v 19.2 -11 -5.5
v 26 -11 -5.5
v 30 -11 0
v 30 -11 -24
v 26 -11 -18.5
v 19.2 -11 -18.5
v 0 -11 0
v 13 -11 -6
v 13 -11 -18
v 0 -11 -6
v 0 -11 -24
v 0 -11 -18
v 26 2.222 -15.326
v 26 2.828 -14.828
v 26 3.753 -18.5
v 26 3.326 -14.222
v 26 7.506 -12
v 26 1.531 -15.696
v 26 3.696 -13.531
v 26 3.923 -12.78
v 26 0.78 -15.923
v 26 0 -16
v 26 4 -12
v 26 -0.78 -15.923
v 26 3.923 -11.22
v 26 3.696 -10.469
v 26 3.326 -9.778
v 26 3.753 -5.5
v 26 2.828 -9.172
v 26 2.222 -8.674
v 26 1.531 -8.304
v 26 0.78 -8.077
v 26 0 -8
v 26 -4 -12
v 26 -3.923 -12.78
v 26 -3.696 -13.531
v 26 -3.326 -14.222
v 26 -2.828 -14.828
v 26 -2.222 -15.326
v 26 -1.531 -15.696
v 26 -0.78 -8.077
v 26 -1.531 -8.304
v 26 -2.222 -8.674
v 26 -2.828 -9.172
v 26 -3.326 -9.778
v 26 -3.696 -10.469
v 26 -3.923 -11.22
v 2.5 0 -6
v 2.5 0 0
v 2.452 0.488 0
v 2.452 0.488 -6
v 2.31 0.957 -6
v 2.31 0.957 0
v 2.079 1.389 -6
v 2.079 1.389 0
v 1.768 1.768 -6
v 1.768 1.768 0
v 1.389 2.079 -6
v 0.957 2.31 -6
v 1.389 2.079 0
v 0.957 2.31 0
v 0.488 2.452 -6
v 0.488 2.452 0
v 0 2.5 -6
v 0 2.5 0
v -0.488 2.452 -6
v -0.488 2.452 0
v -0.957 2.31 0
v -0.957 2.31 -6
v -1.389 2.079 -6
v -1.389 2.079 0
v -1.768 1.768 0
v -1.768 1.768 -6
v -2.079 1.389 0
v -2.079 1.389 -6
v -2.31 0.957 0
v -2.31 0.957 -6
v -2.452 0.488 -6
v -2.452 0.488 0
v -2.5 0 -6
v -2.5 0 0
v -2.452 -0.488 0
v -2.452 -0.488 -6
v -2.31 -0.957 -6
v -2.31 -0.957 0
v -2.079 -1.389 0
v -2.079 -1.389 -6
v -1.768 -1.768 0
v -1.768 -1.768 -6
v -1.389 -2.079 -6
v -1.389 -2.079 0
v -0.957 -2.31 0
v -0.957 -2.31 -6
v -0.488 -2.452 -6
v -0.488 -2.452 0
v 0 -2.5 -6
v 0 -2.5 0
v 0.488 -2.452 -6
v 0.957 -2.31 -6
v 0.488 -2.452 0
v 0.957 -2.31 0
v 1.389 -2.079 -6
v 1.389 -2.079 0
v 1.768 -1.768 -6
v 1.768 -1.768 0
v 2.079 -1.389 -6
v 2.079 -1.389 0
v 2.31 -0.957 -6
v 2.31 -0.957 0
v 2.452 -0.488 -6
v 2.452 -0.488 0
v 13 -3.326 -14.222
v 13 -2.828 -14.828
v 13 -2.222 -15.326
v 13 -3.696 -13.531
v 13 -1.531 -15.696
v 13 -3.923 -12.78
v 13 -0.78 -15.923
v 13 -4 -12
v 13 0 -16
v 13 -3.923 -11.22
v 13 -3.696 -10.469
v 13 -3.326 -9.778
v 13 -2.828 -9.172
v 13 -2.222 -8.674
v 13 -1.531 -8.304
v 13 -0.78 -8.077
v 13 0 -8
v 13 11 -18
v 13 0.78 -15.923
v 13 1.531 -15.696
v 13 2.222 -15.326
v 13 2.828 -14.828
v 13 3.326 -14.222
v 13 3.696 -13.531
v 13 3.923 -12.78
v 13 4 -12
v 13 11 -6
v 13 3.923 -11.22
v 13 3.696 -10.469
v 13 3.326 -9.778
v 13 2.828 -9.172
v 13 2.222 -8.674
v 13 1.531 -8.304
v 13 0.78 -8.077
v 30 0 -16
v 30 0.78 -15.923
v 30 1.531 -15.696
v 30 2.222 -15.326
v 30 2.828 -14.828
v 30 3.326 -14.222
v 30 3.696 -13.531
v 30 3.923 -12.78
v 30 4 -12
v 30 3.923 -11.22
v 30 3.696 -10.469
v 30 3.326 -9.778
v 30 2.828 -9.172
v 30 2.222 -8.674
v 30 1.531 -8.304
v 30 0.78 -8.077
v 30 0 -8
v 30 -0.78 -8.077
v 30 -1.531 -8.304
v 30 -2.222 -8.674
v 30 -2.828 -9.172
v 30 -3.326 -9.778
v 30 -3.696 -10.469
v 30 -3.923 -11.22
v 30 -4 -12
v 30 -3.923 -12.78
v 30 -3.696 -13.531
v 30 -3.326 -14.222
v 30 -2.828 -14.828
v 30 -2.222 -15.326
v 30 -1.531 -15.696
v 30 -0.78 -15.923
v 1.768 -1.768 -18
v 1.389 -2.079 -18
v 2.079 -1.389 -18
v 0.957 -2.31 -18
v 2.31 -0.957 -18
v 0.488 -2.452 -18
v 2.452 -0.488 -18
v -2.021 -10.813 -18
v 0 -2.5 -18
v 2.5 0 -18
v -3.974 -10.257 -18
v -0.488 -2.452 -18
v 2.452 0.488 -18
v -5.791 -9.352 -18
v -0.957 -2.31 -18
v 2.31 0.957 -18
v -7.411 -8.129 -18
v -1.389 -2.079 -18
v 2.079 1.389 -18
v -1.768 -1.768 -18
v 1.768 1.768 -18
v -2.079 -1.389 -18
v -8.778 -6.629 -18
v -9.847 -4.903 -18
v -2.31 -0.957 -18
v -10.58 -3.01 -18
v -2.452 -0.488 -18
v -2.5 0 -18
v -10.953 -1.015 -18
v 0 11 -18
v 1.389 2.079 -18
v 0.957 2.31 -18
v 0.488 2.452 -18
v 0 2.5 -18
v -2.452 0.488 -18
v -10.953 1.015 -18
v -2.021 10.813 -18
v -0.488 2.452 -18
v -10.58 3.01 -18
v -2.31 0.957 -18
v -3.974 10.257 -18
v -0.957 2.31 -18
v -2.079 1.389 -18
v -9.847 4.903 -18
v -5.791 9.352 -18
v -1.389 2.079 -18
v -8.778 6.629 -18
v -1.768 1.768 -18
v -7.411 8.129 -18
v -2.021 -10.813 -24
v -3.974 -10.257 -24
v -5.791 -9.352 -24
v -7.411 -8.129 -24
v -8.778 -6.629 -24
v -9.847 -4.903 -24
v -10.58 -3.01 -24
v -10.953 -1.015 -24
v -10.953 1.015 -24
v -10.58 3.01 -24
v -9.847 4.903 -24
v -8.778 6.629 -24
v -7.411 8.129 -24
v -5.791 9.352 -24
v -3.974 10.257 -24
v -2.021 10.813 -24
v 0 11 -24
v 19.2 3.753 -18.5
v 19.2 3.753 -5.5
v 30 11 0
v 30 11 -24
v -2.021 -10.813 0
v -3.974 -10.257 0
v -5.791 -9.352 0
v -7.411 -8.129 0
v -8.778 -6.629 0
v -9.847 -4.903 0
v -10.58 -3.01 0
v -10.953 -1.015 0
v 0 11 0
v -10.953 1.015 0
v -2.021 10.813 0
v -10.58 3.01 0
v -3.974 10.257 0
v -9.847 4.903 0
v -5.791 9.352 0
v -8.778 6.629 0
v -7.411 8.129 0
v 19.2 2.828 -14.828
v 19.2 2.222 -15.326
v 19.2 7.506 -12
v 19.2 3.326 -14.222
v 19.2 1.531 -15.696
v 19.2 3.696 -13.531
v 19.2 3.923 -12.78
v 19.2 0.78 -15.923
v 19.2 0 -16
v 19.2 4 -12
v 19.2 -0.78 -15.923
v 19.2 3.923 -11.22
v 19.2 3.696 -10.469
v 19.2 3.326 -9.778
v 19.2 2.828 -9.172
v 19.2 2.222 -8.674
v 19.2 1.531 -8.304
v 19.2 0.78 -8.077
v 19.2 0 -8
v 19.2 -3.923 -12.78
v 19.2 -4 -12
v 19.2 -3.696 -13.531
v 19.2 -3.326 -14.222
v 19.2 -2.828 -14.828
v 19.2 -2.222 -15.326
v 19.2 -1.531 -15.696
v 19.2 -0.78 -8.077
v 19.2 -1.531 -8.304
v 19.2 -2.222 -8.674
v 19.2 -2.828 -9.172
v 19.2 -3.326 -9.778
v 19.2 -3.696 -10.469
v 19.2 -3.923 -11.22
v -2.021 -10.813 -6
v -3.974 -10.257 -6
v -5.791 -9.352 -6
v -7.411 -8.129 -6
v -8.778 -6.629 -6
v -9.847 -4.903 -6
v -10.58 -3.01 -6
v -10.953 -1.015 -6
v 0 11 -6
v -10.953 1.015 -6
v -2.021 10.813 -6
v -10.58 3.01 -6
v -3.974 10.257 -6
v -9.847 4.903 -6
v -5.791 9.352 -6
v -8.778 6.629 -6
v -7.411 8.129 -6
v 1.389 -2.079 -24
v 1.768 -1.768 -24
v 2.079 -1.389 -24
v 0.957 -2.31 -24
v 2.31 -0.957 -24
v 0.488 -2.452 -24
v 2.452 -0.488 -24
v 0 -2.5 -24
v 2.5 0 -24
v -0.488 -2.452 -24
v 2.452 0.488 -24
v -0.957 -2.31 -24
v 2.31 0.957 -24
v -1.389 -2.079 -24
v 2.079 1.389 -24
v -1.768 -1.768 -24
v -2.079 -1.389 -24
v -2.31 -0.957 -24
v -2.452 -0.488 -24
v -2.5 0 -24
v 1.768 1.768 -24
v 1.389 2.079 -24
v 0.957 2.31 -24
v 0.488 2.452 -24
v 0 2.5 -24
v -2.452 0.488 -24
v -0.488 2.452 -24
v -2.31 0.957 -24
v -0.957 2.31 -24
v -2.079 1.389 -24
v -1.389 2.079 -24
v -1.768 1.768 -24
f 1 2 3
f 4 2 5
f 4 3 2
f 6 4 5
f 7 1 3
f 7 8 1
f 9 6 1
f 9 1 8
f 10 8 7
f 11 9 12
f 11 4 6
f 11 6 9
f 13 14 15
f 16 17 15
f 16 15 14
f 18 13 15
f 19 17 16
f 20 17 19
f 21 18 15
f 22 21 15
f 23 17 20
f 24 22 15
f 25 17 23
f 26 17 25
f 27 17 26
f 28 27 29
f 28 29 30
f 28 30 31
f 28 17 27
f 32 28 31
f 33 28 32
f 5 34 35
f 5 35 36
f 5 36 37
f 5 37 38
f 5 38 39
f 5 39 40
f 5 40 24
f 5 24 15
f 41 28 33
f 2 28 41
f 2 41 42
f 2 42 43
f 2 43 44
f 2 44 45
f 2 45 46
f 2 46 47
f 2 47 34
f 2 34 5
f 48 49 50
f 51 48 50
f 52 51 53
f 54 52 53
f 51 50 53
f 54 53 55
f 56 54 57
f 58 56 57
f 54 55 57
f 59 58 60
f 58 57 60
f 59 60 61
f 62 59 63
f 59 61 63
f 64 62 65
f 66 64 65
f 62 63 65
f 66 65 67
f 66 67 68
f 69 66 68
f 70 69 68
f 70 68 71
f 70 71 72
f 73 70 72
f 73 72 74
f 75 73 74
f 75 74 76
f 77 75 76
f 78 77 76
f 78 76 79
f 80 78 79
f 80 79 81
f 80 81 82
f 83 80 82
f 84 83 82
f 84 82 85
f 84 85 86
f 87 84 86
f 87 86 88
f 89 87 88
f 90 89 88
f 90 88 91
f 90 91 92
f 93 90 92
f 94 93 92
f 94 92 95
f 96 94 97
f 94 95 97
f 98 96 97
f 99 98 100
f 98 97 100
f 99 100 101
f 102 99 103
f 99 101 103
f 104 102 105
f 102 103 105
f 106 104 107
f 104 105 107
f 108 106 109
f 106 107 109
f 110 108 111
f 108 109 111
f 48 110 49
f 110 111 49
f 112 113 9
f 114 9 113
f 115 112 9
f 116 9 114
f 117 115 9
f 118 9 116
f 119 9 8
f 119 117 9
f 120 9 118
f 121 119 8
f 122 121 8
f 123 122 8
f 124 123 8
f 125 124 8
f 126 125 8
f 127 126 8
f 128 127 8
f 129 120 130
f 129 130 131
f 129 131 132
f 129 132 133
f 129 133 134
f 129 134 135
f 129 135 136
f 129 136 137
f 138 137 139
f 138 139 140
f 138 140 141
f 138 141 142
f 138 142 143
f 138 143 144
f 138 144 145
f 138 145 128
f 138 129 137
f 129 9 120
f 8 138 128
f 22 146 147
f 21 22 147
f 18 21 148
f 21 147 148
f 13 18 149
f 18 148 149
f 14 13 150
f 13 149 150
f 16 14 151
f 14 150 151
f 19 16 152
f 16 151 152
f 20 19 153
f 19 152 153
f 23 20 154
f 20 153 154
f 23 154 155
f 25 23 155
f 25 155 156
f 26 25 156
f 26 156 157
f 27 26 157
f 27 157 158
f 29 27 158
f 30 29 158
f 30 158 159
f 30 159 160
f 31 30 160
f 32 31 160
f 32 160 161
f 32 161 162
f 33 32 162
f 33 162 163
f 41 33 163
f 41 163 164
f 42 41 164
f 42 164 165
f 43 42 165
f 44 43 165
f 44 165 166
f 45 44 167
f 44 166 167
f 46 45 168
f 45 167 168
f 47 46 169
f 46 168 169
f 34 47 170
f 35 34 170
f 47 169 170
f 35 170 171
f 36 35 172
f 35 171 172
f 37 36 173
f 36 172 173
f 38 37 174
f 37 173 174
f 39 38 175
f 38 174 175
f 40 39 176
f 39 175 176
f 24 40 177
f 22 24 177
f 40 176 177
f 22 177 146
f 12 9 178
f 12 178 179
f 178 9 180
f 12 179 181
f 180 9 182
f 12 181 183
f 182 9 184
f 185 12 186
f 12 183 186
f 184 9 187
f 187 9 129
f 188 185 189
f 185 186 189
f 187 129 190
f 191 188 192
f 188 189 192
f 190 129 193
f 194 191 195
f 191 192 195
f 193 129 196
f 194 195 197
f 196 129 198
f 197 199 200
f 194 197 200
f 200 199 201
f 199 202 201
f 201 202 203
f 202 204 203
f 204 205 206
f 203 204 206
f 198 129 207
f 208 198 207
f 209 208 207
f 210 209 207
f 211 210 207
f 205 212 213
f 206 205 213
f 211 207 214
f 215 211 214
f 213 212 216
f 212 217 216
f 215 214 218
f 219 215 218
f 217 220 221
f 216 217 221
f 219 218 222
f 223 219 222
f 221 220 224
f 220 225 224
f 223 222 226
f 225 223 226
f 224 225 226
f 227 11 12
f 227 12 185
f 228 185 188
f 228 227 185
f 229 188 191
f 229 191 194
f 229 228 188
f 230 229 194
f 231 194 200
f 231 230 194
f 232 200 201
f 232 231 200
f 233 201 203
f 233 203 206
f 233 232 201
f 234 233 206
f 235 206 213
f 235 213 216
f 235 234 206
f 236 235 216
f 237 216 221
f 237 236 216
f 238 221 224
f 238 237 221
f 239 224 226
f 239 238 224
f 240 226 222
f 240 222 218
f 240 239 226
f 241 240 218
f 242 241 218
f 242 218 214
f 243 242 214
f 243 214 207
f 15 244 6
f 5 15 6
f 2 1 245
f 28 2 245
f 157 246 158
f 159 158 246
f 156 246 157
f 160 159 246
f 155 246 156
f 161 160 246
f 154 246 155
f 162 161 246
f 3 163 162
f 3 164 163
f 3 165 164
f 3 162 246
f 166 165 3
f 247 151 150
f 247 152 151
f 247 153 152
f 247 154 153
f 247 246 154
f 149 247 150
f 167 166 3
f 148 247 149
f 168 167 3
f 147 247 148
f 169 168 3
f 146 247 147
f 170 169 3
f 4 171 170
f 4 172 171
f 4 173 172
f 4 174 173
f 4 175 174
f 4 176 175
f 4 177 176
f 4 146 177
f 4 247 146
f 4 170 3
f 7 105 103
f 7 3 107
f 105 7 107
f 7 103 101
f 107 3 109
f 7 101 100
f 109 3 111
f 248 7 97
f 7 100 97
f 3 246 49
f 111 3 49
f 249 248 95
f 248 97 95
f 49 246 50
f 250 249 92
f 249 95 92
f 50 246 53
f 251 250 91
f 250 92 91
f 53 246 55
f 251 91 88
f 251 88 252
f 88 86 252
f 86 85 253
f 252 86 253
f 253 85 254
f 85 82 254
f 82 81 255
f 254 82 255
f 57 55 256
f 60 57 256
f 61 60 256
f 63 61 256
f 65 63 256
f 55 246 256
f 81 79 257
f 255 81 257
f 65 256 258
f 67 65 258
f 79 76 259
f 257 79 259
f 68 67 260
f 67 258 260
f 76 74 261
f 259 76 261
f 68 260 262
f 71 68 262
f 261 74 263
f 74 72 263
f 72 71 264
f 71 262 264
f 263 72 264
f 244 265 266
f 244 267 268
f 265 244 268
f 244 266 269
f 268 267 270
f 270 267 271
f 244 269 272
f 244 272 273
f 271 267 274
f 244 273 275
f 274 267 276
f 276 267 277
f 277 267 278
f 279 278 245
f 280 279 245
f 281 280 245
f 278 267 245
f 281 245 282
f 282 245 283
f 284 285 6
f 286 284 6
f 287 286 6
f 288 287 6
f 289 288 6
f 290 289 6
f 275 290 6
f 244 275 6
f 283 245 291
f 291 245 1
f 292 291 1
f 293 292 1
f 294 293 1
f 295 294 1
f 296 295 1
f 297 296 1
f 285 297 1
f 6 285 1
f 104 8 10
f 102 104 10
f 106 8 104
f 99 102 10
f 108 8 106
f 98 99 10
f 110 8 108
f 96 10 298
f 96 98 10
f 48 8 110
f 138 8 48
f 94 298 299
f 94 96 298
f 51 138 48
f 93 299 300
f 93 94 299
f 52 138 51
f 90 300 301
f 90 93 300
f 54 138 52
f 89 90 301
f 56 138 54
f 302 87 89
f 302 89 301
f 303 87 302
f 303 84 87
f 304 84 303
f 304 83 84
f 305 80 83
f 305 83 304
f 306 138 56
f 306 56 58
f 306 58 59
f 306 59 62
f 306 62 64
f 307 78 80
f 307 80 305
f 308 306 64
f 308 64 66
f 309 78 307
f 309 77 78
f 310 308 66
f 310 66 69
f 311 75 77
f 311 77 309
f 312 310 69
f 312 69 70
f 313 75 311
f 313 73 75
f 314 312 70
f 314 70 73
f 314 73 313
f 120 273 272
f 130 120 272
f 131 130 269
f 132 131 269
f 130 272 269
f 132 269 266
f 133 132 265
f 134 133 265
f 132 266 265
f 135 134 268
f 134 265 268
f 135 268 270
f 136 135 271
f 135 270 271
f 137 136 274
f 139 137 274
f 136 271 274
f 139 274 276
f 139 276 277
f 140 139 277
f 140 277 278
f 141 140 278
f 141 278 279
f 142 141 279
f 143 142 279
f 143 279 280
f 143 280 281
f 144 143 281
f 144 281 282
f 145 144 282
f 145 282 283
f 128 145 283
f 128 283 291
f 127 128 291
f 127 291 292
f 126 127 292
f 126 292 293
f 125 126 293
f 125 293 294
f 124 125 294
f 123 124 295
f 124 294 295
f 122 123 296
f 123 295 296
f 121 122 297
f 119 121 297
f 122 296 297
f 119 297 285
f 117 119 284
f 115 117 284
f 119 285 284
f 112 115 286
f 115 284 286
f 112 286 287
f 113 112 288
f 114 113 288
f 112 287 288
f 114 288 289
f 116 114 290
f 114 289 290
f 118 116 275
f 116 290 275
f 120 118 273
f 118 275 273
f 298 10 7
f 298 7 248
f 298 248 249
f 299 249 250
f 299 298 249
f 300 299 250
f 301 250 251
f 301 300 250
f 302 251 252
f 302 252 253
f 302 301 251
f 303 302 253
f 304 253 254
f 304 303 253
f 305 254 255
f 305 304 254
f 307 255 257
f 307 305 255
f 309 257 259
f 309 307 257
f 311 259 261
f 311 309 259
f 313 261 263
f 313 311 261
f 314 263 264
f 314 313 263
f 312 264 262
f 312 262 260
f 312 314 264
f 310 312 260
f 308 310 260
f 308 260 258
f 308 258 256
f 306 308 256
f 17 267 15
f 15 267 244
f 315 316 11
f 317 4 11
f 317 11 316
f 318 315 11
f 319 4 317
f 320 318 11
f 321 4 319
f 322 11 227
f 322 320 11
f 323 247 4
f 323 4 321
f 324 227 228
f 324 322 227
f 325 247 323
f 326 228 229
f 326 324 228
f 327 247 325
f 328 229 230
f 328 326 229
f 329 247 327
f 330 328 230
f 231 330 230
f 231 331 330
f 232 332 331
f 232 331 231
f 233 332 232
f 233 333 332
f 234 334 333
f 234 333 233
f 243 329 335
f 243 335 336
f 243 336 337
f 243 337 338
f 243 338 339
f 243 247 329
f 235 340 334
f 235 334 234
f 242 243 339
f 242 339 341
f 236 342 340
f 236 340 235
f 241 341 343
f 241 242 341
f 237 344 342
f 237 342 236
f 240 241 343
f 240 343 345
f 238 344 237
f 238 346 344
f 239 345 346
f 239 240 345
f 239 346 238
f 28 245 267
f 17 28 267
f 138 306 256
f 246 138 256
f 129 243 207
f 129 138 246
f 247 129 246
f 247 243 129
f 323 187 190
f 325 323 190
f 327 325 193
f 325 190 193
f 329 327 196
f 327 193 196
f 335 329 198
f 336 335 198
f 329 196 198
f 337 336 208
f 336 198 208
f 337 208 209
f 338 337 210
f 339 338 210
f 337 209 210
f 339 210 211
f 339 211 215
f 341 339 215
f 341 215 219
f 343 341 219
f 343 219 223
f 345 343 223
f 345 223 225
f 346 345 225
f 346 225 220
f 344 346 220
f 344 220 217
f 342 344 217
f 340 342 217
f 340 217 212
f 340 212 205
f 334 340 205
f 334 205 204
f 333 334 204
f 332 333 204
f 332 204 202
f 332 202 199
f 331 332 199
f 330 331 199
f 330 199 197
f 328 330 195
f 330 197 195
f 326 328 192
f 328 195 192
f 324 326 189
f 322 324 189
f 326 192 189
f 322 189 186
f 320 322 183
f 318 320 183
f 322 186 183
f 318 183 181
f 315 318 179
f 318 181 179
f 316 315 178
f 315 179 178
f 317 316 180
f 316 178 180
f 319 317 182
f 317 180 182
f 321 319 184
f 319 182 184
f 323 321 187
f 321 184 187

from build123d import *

# Parameters (mm, degrees)
BOSS_EXTRUDE1_DEPTH          = 24
SKETCH2_W                    = 30.110806601
SKETCH2_H                    = 12
CUT_EXTRUDE1_DEPTH           = 45.271887242
CUT_EXTRUDE2_DEPTH           = 6.8
F_7_8_8_DIAMETER_HOLE1_D     = 8
F_7_8_8_DIAMETER_HOLE1_DEPTH = 6.2
F_7_8_8_DIAMETER_HOLE2_D     = 8
F_4_7_5_DIAMETER_HOLE2_D     = 5
F_4_7_5_DIAMETER_HOLE2_DEPTH = 6
F_4_7_5_DIAMETER_HOLE1_D     = 5


with BuildPart() as part:
    # Sketch1 → Boss-Extrude1 (new body)
    with BuildSketch(Plane(origin=(0, 0, -24), x_dir=(-1, 0, 0), z_dir=(0, 0, -1))):
        with BuildLine():
            Line((0, 11), (-30, 11))
            Line((-30, 11), (-30, -11))
            Line((-30, -11), (0, -11))
            ThreePointArc((0, -11), (11, 0), (0, 11))
        make_face()
    extrude(amount=-BOSS_EXTRUDE1_DEPTH)

    # Sketch2 → Cut-Extrude1 (cut, through all)
    with BuildSketch(Plane(origin=(0, 11, 0), x_dir=(-1, 0, 0), z_dir=(0, 1, 0))):
        with Locations((2.055403301, -12)):
            Rectangle(SKETCH2_W, SKETCH2_H)
    extrude(amount=-CUT_EXTRUDE1_DEPTH, mode=Mode.SUBTRACT)

    # Sketch3 → Cut-Extrude2 (cut)
    with BuildSketch(Plane(origin=(19.2, 0, 0), x_dir=(0, -1, 0), z_dir=(-1, 0, 0))):
        Polygon((11, -18.5), (11, -5.5), (-3.75277675, -5.5), (-7.505553499, -12), (-3.75277675, -18.5), align=None)
    extrude(amount=-CUT_EXTRUDE2_DEPTH, mode=Mode.SUBTRACT)

    # Ø7.8 (8) Diameter Hole1
    with Locations(Plane.ZY.offset(-13)):
        with Locations((-12, 0)):
            Hole(F_7_8_8_DIAMETER_HOLE1_D / 2, depth=F_7_8_8_DIAMETER_HOLE1_DEPTH)

    # Ø7.8 (8) Diameter Hole2 (through all)
    with Locations(Plane.ZY.offset(-26)):
        with Locations((-12, 0)):
            Hole(F_7_8_8_DIAMETER_HOLE2_D / 2)

    # Ø4.7 (5) Diameter Hole2
    with Locations(Plane(origin=(0, 0, -24), x_dir=(-1, 0, 0), z_dir=(0, 0, -1))):
        with Locations((0, 0)):
            Hole(F_4_7_5_DIAMETER_HOLE2_D / 2, depth=F_4_7_5_DIAMETER_HOLE2_DEPTH)

    # Ø4.7 (5) Diameter Hole1 (through all)
    with Locations(Plane(origin=(0, 0, -6), x_dir=(-1, 0, 0), z_dir=(0, 0, -1))):
        with Locations((0, 0)):
            Hole(F_4_7_5_DIAMETER_HOLE1_D / 2)


solid = part.part
